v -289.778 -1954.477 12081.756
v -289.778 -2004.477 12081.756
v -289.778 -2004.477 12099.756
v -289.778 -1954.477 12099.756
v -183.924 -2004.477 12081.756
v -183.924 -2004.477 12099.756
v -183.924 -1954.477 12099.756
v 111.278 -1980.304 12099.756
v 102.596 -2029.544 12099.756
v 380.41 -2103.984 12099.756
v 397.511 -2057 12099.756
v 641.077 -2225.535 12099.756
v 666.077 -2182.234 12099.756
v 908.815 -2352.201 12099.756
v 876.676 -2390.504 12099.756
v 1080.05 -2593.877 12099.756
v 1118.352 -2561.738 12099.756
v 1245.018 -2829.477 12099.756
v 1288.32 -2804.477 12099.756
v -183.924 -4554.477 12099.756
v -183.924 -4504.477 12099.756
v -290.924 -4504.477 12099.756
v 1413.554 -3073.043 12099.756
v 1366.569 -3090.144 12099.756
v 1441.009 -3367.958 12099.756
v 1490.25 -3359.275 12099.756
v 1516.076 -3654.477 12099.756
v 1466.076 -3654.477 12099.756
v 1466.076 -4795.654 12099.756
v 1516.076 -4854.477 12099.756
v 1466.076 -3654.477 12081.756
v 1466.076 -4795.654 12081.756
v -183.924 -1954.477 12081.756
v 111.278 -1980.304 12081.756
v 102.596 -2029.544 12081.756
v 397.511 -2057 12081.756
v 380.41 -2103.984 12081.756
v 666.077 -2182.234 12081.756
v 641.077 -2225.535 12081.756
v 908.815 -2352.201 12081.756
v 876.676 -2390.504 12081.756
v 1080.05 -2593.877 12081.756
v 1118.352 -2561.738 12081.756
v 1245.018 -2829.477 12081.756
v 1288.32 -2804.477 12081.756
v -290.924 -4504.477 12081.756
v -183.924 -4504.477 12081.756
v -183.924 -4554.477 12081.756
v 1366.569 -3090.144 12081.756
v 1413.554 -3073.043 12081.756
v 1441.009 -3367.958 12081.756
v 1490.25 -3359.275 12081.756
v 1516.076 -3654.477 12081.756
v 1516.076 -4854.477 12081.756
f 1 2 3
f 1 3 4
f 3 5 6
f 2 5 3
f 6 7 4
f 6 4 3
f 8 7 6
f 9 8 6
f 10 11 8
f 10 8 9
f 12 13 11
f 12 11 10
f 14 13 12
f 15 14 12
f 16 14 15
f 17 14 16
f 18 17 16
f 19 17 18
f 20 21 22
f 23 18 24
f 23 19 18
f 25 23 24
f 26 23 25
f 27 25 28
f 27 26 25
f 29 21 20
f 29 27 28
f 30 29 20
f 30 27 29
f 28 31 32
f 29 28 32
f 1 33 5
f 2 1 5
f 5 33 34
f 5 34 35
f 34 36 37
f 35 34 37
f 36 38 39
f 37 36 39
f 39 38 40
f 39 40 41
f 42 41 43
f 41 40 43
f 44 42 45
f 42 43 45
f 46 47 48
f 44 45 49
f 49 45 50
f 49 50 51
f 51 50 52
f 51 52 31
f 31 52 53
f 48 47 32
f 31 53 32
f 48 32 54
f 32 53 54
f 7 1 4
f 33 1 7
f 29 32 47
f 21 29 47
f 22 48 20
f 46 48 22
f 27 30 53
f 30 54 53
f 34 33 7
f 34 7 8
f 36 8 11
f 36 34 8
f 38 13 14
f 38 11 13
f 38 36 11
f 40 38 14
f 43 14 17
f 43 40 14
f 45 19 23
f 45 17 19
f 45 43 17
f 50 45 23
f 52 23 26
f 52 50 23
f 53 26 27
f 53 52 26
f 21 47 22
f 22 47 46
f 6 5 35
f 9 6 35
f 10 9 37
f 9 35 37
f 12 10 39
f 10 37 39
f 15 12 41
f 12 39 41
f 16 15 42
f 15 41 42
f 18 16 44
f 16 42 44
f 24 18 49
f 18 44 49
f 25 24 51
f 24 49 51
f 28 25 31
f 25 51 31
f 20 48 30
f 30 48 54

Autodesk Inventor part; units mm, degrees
ref_plane "YZ Plane" through (0, 0, 0) normal (1, 0, 0) x (0, 1, 0)
ref_plane "XZ Plane" through (0, 0, 0) normal (0, 1, 0) x (-1, 0, 0)
ref_plane "XY Plane" through (0, 0, 0) normal (0, 0, 1) x (1, 0, 0)
ref_plane "Work Plane1" through (-210.1828, -2684.477, 12081.7565) normal (0, 0, 1) x (0, -1, 0)
sketch "Sketch3" plane through (-210.1828, -2684.477, 12081.7565) normal (0, 0, 1) x (0, -1, 0)
  line L0 (-680, -79.5954) -> (-730, -79.5954)
  line L1 (-730, -79.5954) -> (-730, 26.2593)
  line L2 (-730, 26.2593) -> (-680, 26.2593)
  line L3 (-680, 26.2593) -> (-680, -79.5954)
  line L4 (1820, -80.7407) -> (1870, -80.7407)
  line L5 (1870, -80.7407) -> (1870, 26.2593)
  line L6 (1870, 26.2593) -> (1820, 26.2593)
  line L7 (1820, 26.2593) -> (1820, -80.7407)
  line L8 (-680, 26.2593) -> (1820, 26.2593)
  arc A0 (970, 1726.2593) -> (-730, 26.2593) centre (970, 26.2593) ccw
  line L9 (970, 26.2593) -> (970, 1726.2593) construction
  line L10 (970, 26.2593) -> (-730, 26.2593) construction
  arc A1 (970, 1676.2593) -> (-680, 26.2593) centre (970, 26.2593) ccw
  line L11 (970, 1676.2593) -> (2111.1765, 1676.2593)
  line L12 (2111.1765, 1676.2593) -> (1820, 26.2593)
  line L13 (1870, 26.2593) -> (2170, 1726.2593)
  line L14 (2170, 1726.2593) -> (970, 1726.2593)
  line L15 (1870, 26.2593) -> (1820, -80.7407)
  point P0 (-2684.477, 210.1828)
  dimension "d18" = 50
  dimension "d19" = 50
  dimension "d20" = 90
  dimension "d21" = 1700
  dimension "d22" = 107
  dimension "d23" = 300
extrude "Extrusion1" add sketch "Sketch3" along normal blind 18 contours L0 L1 L2 L3 | L2 A0 L14 L13 L6 L12 L11 A1 | L6 L15 L7
properties part number "SideWoodL" material "Wood (Birch)"
